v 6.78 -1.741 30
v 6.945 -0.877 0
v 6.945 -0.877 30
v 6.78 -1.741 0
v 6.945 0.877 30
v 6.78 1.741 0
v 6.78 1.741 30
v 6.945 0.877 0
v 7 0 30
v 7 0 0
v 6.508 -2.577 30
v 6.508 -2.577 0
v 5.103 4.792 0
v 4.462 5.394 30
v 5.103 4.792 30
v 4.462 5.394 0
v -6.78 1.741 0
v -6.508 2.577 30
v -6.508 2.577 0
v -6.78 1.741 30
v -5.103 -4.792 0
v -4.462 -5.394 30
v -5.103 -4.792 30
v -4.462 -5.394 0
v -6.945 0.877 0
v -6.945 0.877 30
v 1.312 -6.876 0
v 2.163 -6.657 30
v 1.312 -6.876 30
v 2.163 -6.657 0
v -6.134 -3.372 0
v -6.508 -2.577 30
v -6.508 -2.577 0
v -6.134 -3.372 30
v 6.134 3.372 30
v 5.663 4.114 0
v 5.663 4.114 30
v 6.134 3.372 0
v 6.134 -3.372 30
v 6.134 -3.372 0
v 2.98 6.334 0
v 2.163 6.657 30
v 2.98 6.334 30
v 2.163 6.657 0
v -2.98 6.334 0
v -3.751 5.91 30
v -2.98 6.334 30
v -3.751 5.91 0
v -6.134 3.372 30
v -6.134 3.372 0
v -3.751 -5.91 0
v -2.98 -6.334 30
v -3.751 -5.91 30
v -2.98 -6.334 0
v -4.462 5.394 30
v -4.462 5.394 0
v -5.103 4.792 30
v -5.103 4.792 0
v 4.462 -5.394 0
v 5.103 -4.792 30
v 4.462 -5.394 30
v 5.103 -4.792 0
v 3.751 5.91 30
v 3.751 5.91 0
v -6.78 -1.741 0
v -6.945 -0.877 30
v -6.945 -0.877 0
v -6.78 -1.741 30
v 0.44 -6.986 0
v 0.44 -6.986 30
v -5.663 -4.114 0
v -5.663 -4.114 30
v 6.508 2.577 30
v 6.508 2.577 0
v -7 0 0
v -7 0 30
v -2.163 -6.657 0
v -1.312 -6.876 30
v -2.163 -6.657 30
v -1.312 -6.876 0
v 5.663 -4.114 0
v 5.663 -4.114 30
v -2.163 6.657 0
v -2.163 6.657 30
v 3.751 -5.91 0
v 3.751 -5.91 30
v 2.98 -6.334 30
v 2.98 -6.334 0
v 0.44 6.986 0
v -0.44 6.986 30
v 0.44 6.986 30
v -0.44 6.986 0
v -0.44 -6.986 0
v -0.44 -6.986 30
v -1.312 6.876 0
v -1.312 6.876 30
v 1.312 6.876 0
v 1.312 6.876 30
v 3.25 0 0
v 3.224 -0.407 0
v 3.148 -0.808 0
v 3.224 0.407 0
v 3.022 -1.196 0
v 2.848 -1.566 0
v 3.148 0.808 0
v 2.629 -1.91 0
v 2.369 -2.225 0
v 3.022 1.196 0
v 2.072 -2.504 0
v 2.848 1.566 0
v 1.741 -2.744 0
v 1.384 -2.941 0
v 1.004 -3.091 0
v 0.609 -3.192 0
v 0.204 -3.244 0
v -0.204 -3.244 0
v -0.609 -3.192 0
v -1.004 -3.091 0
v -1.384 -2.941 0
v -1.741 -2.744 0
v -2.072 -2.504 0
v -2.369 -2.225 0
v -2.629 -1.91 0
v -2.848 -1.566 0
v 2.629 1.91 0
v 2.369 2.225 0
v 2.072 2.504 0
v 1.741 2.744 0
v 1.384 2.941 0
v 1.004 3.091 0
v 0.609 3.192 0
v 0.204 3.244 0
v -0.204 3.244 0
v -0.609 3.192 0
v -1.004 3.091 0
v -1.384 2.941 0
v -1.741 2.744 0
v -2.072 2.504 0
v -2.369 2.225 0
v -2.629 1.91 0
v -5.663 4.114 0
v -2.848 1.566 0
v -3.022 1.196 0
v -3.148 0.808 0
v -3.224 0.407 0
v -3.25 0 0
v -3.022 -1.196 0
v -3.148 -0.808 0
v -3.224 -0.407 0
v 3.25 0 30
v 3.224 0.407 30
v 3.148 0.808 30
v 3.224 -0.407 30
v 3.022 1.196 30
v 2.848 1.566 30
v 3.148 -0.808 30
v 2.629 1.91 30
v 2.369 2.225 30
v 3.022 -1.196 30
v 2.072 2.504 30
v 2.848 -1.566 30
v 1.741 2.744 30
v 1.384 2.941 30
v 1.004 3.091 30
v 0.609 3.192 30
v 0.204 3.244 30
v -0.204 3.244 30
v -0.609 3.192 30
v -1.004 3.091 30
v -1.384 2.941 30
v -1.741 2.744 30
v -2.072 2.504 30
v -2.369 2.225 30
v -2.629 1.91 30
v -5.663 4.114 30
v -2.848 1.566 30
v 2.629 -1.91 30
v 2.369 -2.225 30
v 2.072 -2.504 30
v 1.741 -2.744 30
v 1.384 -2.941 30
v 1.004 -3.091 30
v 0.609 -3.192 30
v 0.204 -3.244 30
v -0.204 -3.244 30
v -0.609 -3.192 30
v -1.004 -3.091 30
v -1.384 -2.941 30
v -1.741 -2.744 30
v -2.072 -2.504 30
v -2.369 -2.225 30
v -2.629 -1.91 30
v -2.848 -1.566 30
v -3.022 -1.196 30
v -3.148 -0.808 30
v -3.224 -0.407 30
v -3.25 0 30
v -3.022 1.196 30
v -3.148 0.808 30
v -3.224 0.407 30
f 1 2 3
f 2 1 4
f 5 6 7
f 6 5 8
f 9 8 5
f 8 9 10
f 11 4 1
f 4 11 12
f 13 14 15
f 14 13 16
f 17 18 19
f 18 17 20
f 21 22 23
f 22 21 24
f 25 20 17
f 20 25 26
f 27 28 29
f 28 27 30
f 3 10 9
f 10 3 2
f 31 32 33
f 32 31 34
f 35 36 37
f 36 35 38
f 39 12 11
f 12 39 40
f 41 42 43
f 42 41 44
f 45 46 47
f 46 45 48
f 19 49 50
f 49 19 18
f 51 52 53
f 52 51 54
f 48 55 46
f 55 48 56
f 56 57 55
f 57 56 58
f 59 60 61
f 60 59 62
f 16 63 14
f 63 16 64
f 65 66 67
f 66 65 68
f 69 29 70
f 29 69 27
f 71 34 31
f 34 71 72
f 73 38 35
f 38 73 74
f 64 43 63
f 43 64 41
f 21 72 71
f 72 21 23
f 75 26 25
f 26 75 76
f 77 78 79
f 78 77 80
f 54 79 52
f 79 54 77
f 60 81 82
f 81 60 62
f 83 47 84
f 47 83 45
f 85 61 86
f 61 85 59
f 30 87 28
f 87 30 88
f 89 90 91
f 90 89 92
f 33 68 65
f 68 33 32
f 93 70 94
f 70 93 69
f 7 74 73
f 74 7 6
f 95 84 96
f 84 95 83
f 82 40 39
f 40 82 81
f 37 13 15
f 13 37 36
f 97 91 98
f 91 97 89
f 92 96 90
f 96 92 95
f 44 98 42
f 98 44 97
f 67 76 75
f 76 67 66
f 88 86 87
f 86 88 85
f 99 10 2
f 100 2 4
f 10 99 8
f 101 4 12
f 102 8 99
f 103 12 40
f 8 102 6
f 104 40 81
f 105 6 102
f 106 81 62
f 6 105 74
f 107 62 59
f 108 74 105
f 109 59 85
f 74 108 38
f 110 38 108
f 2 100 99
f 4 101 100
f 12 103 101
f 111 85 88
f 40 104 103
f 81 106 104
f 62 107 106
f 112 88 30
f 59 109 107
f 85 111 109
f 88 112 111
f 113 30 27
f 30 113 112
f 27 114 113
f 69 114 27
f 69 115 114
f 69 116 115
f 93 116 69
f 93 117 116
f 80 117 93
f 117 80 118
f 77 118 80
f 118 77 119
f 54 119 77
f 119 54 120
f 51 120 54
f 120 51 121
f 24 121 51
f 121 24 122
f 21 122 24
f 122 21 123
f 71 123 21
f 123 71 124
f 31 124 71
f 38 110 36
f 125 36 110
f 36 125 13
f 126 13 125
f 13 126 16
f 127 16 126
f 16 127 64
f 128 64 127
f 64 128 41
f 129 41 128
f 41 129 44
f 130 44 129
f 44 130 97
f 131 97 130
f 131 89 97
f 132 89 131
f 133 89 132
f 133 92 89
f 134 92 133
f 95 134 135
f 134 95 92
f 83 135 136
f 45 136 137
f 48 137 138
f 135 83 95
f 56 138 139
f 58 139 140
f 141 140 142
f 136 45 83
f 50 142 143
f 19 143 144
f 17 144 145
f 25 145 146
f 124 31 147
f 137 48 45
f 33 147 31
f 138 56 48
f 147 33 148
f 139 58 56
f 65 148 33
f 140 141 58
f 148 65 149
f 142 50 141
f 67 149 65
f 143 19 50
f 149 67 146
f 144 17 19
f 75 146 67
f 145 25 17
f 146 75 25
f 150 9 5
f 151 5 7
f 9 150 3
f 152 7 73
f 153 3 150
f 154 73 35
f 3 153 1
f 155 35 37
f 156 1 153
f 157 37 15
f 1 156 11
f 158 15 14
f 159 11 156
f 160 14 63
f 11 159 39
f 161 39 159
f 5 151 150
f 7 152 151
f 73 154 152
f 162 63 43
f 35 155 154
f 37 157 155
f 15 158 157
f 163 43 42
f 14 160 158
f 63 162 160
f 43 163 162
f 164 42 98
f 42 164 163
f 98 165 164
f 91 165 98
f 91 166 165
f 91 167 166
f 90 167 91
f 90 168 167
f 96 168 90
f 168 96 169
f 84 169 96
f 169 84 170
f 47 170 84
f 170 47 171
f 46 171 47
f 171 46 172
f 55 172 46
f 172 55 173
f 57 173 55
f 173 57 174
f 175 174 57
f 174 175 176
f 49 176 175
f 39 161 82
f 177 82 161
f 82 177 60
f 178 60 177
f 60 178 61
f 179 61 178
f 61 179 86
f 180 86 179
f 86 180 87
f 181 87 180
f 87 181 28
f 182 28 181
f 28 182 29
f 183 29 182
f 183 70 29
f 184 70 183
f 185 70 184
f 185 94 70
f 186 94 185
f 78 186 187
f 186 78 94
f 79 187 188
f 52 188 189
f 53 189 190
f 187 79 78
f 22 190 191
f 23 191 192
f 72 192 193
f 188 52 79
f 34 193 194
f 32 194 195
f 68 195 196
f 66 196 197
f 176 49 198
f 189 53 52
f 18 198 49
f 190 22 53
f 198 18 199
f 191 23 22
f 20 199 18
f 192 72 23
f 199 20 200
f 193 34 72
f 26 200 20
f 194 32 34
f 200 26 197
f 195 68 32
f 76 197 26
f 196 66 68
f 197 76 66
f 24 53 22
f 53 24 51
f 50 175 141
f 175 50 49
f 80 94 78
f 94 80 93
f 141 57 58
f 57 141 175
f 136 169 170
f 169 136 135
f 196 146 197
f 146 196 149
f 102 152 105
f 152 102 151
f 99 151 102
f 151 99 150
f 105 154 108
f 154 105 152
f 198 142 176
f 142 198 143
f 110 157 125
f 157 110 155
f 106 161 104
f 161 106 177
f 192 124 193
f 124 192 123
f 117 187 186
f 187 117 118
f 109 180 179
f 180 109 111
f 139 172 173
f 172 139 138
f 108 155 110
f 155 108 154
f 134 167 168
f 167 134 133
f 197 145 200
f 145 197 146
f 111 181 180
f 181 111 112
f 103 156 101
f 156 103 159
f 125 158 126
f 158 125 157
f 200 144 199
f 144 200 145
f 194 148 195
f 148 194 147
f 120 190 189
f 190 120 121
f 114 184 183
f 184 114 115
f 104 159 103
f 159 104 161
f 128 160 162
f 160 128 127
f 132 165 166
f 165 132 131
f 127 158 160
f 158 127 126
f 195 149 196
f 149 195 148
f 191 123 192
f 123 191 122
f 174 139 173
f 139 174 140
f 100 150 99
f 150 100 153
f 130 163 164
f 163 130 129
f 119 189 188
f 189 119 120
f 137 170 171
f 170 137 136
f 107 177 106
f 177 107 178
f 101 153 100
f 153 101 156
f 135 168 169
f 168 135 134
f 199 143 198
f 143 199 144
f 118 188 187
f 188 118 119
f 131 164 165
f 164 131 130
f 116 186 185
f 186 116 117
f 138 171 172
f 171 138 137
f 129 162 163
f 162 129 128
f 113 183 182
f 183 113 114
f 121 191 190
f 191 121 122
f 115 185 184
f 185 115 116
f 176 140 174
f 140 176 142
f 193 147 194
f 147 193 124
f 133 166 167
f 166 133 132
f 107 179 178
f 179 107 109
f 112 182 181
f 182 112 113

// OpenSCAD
$fn = 50;


difference() {
	union() {
		cylinder(h = 30, r = 7.0000000000);
	}
	union() {
		translate(v = [0.0000000000, 0.0000000000, -100.0000000000]) {
			cylinder(h = 200, r = 3.2500000000);
		}
	}
}
